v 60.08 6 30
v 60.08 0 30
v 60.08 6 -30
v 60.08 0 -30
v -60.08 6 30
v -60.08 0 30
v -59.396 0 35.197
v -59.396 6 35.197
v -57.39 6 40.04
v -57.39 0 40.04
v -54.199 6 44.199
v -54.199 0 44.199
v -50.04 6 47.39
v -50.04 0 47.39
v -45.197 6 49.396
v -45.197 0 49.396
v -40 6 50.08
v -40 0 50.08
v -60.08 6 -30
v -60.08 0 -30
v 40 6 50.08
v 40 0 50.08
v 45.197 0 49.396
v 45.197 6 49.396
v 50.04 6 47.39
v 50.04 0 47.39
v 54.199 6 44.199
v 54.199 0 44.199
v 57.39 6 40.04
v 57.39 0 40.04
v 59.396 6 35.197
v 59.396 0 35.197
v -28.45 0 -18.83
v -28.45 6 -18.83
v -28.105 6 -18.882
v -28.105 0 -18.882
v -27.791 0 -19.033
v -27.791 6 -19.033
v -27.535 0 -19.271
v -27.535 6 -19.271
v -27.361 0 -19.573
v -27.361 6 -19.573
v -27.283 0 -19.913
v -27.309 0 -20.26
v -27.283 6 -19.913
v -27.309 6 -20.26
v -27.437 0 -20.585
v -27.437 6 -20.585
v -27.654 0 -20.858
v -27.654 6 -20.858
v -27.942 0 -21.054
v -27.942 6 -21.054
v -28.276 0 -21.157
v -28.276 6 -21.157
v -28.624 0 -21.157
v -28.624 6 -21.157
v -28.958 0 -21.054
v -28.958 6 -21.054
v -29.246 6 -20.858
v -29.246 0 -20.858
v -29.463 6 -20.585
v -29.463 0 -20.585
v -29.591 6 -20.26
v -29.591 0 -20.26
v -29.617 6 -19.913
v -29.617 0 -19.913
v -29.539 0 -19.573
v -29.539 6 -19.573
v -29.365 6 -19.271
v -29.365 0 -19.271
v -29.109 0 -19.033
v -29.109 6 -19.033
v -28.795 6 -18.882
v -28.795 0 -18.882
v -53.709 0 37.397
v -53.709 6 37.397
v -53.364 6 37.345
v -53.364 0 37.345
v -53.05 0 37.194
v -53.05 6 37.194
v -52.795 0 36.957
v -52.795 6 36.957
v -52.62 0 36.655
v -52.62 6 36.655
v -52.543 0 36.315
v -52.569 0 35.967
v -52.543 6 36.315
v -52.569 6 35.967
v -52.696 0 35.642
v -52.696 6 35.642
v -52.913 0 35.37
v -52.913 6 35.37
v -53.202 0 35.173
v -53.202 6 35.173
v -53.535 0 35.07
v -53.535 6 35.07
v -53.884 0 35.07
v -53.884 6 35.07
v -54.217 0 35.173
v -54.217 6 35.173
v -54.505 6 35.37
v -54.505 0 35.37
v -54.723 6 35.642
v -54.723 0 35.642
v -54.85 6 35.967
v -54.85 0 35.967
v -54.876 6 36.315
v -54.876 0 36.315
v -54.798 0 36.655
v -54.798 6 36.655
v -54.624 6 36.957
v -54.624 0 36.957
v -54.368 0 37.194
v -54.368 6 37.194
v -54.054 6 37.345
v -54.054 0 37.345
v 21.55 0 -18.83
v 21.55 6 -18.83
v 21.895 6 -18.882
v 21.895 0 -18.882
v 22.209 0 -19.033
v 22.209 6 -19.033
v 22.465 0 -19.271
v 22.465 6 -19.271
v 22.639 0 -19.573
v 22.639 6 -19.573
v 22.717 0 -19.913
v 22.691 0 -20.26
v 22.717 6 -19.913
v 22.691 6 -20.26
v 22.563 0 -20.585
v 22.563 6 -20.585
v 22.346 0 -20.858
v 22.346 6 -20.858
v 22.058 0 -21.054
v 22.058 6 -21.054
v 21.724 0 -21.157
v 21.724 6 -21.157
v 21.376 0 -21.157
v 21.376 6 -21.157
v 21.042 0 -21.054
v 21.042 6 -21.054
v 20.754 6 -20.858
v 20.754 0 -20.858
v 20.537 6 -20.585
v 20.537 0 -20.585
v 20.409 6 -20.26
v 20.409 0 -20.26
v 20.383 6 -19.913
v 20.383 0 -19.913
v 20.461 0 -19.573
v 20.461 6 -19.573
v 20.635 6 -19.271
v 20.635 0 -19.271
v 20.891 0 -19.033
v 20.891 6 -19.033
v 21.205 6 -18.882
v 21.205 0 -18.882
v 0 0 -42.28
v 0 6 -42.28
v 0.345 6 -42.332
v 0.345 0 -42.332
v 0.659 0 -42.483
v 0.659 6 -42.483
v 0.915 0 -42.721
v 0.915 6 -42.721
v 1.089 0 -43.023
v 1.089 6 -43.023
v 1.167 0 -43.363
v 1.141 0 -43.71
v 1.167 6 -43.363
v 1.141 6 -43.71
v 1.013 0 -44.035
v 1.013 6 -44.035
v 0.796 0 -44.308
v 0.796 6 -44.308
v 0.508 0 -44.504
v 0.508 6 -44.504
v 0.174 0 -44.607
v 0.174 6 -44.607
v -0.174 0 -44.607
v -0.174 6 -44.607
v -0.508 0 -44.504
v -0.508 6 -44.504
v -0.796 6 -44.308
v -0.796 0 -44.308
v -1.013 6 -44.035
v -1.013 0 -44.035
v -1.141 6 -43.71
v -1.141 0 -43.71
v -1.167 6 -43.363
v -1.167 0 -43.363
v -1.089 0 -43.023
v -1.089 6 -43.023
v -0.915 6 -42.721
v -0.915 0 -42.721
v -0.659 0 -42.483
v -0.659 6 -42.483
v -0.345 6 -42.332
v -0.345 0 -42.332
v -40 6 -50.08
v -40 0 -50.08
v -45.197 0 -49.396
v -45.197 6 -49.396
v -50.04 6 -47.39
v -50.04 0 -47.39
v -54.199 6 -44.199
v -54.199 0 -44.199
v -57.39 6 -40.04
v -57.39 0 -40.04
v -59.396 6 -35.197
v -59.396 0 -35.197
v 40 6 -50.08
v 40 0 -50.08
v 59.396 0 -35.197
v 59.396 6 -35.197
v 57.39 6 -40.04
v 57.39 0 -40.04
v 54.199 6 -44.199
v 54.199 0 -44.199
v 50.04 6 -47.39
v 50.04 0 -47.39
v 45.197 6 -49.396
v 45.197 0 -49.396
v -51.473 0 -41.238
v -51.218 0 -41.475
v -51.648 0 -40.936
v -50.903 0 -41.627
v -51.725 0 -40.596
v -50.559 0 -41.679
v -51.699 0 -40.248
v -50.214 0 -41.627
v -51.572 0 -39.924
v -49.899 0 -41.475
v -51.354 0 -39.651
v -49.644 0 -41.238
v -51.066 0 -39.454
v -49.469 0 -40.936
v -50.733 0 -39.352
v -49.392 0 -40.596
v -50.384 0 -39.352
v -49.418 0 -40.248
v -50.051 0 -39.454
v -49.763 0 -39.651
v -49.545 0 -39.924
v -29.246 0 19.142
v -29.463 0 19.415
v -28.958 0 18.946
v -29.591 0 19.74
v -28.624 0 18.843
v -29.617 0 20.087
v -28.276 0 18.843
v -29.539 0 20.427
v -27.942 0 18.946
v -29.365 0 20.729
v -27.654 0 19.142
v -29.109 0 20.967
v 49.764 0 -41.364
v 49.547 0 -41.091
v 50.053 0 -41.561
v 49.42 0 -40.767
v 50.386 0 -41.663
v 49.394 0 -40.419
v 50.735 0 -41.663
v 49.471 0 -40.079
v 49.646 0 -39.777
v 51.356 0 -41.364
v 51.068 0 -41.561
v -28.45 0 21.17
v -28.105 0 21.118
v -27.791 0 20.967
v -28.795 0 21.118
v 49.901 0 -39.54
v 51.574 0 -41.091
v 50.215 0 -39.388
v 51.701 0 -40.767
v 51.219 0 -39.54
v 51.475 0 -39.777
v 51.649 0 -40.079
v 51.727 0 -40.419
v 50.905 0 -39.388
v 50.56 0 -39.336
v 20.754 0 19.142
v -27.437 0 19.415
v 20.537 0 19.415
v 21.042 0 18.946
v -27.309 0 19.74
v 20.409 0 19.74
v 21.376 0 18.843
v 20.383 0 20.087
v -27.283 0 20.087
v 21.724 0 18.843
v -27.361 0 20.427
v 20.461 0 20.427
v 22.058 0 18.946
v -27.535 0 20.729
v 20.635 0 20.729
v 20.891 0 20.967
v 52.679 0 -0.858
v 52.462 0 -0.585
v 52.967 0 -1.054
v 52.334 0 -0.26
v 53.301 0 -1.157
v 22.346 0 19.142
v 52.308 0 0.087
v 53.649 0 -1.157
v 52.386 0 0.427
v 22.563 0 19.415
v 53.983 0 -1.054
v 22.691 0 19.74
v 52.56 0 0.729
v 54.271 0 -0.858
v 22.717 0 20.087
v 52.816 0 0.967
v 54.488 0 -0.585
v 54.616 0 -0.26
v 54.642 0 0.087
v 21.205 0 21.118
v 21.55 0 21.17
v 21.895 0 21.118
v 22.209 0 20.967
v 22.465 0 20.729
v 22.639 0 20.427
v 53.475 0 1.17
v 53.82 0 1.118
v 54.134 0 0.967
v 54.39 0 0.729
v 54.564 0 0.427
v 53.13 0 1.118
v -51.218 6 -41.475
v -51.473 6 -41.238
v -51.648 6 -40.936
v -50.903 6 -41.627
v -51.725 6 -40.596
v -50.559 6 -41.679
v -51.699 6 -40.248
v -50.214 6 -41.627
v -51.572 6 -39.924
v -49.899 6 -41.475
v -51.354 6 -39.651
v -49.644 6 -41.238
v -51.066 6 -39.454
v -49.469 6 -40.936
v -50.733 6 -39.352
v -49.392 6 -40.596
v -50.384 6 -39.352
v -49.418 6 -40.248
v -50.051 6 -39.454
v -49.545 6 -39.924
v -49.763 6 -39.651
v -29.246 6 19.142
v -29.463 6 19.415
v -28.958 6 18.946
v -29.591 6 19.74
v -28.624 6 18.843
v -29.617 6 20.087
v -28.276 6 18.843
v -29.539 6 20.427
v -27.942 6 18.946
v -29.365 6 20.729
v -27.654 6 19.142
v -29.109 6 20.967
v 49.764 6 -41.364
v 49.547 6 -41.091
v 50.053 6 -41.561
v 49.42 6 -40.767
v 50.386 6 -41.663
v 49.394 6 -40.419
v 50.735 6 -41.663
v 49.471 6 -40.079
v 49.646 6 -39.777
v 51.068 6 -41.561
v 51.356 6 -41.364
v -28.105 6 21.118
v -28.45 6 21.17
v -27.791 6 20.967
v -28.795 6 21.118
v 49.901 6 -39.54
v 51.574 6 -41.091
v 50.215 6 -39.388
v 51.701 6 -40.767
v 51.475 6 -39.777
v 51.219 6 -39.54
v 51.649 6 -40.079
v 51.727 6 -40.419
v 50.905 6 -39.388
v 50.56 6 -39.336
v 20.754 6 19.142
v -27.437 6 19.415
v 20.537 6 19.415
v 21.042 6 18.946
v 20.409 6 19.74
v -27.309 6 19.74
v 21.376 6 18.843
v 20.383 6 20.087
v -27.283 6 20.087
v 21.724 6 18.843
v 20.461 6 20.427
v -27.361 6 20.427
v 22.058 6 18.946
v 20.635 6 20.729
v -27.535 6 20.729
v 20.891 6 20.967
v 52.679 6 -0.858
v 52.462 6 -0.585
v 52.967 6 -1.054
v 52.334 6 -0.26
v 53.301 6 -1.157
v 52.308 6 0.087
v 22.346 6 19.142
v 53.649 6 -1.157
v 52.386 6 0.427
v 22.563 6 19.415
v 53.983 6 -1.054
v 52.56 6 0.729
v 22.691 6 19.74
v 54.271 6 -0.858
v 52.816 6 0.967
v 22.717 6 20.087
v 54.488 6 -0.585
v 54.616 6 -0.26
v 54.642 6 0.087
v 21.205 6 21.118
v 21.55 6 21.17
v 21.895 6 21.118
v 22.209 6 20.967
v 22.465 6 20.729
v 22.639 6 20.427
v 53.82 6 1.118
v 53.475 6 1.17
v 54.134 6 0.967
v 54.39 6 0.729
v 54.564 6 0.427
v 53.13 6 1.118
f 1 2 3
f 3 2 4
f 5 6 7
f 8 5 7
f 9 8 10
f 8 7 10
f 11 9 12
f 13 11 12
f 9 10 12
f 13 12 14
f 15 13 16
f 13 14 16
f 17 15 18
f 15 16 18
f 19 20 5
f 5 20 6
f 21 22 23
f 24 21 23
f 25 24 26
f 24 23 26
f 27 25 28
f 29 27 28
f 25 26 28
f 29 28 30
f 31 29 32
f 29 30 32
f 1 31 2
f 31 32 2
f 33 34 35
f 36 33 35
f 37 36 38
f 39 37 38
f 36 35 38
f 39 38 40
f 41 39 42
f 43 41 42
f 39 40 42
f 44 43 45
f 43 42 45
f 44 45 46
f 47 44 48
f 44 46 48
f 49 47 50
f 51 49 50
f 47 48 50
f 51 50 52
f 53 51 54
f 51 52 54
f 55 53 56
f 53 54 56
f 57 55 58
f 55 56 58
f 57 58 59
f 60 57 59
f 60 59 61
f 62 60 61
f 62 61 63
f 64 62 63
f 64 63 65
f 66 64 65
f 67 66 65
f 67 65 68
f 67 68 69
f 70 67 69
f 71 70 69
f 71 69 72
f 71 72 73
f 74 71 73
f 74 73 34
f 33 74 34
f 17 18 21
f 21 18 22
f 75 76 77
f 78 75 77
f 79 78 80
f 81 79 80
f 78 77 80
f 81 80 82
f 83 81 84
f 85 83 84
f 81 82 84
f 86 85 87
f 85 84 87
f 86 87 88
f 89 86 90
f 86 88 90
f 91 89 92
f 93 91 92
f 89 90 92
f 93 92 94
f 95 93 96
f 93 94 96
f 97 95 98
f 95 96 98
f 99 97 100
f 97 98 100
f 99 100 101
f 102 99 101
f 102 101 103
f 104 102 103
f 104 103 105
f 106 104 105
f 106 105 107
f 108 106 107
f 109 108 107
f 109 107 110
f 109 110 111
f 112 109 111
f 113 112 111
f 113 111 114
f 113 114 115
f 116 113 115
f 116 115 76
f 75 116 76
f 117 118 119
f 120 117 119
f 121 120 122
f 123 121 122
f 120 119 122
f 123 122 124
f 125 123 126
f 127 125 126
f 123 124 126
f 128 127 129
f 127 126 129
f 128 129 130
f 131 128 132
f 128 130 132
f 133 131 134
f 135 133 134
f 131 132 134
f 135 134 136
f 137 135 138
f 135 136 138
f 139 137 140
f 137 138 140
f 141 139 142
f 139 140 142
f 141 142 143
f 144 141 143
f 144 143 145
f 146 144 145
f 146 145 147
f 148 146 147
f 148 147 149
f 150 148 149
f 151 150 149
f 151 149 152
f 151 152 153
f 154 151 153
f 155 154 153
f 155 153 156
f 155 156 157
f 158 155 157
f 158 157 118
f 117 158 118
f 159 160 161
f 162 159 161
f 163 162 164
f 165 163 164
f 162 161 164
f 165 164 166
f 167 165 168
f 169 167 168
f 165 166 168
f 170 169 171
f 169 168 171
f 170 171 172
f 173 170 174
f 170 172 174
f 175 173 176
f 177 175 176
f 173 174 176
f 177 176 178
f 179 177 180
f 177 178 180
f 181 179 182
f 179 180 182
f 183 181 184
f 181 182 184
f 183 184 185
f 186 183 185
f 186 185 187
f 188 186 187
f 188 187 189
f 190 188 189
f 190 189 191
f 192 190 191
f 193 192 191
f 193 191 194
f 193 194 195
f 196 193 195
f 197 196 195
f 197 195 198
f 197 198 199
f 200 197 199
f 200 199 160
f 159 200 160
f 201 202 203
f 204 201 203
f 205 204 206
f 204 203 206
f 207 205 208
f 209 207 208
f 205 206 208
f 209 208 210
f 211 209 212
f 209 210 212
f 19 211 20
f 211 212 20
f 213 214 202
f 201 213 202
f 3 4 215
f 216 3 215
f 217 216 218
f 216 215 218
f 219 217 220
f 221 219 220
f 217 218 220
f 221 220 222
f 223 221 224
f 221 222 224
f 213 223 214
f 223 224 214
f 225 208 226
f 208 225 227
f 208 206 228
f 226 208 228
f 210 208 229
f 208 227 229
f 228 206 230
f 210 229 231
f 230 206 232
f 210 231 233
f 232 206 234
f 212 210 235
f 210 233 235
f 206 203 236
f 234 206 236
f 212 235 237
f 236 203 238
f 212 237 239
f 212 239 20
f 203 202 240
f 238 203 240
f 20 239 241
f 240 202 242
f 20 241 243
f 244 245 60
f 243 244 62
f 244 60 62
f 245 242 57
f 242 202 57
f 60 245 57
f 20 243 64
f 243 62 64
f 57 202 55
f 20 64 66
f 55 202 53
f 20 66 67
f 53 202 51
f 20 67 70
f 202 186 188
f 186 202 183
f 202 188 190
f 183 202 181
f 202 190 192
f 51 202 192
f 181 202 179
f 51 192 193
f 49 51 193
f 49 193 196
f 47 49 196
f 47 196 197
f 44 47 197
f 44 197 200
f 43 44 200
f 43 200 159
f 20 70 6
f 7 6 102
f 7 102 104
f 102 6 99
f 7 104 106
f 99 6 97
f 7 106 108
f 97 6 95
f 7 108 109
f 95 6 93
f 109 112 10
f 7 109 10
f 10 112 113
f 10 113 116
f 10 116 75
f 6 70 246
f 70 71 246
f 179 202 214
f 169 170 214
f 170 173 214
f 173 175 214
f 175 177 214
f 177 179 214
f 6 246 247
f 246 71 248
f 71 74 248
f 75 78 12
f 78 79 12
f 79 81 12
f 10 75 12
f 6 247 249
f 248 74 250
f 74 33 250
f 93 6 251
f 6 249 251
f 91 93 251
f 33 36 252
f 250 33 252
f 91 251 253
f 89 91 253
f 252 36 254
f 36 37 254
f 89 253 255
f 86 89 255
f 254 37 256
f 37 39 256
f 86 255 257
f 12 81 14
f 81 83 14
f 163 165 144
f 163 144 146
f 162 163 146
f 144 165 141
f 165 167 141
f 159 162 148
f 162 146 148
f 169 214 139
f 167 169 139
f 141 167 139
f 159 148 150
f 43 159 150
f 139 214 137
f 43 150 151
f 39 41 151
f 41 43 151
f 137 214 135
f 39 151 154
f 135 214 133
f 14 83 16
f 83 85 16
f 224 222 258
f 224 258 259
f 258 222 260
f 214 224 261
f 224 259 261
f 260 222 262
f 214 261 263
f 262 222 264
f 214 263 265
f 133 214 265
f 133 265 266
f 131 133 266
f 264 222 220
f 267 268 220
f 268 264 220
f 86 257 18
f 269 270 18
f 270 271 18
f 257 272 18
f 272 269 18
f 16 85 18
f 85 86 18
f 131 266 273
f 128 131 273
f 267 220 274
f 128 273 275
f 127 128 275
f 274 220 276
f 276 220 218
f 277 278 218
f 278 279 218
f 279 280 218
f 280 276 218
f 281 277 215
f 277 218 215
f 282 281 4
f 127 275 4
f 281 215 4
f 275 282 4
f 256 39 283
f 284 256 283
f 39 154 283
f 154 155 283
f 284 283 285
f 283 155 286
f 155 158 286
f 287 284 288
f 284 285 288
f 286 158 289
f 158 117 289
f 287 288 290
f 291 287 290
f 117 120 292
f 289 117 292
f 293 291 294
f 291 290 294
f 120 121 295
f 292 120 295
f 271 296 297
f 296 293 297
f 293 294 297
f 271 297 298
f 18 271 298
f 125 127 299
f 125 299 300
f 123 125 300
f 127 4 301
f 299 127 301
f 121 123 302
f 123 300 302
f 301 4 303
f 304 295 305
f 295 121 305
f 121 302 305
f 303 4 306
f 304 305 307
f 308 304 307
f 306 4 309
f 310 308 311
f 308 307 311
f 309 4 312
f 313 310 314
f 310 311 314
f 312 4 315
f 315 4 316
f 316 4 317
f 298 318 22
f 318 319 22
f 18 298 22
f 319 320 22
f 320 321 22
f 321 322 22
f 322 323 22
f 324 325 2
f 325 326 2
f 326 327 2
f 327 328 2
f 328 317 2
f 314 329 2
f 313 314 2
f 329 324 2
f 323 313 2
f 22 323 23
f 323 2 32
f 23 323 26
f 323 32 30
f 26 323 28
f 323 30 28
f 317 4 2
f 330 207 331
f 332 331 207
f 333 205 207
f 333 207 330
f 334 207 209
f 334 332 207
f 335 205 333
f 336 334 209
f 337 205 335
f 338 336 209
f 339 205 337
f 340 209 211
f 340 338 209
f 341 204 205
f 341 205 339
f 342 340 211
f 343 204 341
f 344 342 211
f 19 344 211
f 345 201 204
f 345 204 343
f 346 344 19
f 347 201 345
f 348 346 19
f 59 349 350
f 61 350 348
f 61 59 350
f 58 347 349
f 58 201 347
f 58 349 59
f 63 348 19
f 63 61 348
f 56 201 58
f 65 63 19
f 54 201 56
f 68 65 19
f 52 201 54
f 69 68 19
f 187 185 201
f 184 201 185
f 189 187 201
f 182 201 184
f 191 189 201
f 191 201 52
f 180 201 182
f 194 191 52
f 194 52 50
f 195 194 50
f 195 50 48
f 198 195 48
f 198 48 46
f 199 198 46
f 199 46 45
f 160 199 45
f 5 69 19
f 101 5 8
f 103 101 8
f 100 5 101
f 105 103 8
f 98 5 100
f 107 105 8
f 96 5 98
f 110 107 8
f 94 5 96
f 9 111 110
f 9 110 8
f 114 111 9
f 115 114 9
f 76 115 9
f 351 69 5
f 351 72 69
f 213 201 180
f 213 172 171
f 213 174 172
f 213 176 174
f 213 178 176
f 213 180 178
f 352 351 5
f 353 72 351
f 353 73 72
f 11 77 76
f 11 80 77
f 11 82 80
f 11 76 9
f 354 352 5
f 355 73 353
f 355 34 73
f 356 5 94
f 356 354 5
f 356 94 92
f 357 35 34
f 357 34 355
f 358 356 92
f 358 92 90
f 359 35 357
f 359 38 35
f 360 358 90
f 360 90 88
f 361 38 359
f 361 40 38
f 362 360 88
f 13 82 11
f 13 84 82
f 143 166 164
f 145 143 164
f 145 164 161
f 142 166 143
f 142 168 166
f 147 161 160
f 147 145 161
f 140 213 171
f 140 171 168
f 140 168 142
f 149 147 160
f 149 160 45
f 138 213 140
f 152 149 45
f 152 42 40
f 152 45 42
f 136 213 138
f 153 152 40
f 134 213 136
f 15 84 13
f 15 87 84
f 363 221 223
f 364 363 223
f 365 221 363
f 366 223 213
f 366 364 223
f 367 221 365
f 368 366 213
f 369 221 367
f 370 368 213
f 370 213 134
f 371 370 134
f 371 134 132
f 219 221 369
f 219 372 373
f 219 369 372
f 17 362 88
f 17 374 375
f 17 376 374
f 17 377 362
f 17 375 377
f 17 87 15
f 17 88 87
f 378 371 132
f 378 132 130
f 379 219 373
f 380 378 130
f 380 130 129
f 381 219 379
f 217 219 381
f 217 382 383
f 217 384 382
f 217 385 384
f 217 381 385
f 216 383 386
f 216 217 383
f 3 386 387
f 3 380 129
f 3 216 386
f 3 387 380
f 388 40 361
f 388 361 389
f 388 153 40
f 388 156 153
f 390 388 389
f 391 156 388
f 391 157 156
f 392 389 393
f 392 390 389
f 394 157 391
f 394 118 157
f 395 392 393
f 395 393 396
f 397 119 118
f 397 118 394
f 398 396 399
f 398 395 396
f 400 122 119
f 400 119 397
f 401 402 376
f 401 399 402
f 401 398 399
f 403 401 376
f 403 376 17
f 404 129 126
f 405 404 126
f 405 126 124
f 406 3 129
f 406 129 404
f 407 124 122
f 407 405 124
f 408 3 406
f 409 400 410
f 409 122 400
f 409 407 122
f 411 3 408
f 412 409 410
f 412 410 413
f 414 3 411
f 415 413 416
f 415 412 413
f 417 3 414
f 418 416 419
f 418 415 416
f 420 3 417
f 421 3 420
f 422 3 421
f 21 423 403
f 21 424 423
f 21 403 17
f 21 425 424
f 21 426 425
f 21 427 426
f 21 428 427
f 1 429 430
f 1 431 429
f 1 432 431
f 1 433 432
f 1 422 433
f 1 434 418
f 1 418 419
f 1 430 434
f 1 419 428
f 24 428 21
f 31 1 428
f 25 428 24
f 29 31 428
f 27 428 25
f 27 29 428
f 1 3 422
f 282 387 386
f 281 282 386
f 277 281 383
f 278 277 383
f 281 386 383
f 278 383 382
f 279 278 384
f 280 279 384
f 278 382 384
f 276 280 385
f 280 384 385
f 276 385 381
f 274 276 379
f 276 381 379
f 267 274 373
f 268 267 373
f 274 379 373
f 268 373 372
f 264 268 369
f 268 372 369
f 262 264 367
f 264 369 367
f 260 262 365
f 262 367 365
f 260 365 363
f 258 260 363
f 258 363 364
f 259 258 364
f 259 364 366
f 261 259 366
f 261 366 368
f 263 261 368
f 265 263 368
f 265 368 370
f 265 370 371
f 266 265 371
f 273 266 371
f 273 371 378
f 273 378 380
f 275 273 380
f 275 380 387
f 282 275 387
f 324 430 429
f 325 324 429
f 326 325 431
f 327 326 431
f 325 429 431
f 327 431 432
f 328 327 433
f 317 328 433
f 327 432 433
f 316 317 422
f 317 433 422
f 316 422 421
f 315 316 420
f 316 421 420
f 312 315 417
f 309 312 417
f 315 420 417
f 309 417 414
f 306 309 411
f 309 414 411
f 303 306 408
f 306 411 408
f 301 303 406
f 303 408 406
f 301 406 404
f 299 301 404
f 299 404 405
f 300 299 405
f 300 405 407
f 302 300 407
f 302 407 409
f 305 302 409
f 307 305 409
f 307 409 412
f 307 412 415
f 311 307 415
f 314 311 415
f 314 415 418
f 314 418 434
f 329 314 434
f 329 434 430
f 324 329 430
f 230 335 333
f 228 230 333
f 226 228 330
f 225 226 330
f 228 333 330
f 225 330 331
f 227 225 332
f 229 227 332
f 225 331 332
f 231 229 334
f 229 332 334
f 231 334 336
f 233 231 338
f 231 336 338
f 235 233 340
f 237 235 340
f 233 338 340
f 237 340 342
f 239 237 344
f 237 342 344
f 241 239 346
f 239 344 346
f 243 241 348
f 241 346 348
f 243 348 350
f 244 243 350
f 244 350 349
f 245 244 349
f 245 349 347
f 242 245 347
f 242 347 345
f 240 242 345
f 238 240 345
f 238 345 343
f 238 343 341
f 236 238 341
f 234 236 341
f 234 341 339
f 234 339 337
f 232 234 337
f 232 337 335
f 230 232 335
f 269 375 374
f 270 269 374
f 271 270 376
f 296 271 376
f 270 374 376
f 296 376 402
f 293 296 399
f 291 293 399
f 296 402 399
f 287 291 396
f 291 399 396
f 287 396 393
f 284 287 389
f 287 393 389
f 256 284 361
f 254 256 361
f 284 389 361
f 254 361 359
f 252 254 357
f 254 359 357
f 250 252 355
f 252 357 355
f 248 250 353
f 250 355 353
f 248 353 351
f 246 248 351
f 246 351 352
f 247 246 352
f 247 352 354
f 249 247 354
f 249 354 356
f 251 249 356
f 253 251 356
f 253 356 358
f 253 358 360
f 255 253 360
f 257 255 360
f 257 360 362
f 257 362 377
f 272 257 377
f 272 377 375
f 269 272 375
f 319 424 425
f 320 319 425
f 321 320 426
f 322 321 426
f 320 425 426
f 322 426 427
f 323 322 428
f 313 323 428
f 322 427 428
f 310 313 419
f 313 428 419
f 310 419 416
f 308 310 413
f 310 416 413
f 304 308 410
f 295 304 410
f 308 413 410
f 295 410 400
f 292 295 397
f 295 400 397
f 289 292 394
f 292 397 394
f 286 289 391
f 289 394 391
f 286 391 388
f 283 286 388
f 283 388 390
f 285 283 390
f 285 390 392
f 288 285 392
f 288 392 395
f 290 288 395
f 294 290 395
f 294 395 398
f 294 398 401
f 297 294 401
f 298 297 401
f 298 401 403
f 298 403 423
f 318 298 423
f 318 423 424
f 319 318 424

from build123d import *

# Parameters (mm, degrees)
BOSS_EXTRUDE1_DEPTH = 6
SKETCH2_R           = 1.25
CUT_EXTRUDE1_DEPTH  = 79.33262411
SKETCH3_R           = 1.25
CUT_EXTRUDE2_DEPTH  = 79.33262411
MOVE_FACE1_BY       = 0.08
MOVE_FACE1_2_BY     = 0.08
MOVE_FACE1_3_BY     = 0.08
MOVE_FACE1_4_BY     = 0.08
MOVE_FACE1_5_BY     = 0.08
MOVE_FACE1_6_BY     = 0.08
MOVE_FACE1_7_BY     = 0.08
MOVE_FACE1_8_BY     = 0.08
MOVE_FACE1_9_BY     = 0.08
MOVE_FACE1_10_BY    = 0.08
MOVE_FACE1_11_BY    = 0.08
MOVE_FACE1_12_BY    = 0.08
MOVE_FACE1_13_BY    = 0.08
MOVE_FACE1_14_BY    = 0.08
MOVE_FACE1_15_BY    = 0.08
MOVE_FACE1_16_BY    = 0.08
MOVE_FACE1_17_BY    = 0.08


with BuildPart() as part:
    # Sketch1 → Boss-Extrude1 (new body)
    with BuildSketch(Plane(origin=(0, 0, 0), x_dir=(1, 0, 0), z_dir=(0, 1, 0))):
        with BuildLine():
            Line((-60, 30), (-60, -30))
            ThreePointArc((-60, -30), (-54.142135624, -44.142135624), (-40, -50))
            Line((-40, -50), (40, -50))
            ThreePointArc((40, -50), (54.142135624, -44.142135624), (60, -30))
            Line((60, -30), (60, 30))
            ThreePointArc((60, 30), (54.142135624, 44.142135624), (40, 50))
            Line((40, 50), (-40, 50))
            ThreePointArc((-40, 50), (-54.142135624, 44.142135624), (-60, 30))
        make_face()
    extrude(amount=BOSS_EXTRUDE1_DEPTH)

    # Sketch2 → Cut-Extrude1 (cut, through all)
    with BuildSketch(Plane(origin=(0, 6, 0), x_dir=(1, 0, 0), z_dir=(0, 1, 0))):
        with Locations(Location((53.475, 0, 0), (0, 0, 270))):
            Circle(SKETCH2_R)
        with Locations(Location((-53.709292606, -36.227375296, 0), (0, 0, 270))):
            Circle(SKETCH2_R)
        with Locations(Location((0, 43.45, 0), (0, 0, 270))):
            Circle(SKETCH2_R)
        with Locations(Location((50.560271927, 40.506415982, 0), (0, 0, 270))):
            Circle(SKETCH2_R)
        with Locations(Location((-50.558556763, 40.508556763, 0), (0, 0, 90))):
            Circle(SKETCH2_R)
    extrude(amount=-CUT_EXTRUDE1_DEPTH, mode=Mode.SUBTRACT)

    # Sketch3 → Cut-Extrude2 (cut, through all)
    with BuildSketch(Plane(origin=(0, 6, 0), x_dir=(1, 0, 0), z_dir=(0, 1, 0))):
        with Locations(Location((-28.45, 20, 0), (0, 0, 270))):
            Circle(SKETCH3_R)
        with Locations(Location((21.55, 20, 0), (0, 0, 270))):
            Circle(SKETCH3_R)
        with Locations(Location((-28.45, -20, 0), (0, 0, 270))):
            Circle(SKETCH3_R)
        with Locations(Location((21.55, -20, 0), (0, 0, 270))):
            Circle(SKETCH3_R)
    extrude(amount=-CUT_EXTRUDE2_DEPTH, mode=Mode.SUBTRACT)

    # Move Face1: a curved face moved outward by 0.08
    add(Solid.thicken(part.faces().sort_by_distance((21.55, 3, 18.75))[0], MOVE_FACE1_BY))

    # Move Face1 2: a curved face moved outward by 0.08
    add(Solid.thicken(part.faces().sort_by_distance((54.142135624, 3, 44.142135624))[0], MOVE_FACE1_2_BY))

    # Move Face1 3: a face moved outward by 0.08
    extrude(part.faces().sort_by_distance((60, 3, 0))[0], amount=MOVE_FACE1_3_BY, dir=(1, 0, 0))

    # Move Face1 4: a curved face moved outward by 0.08
    add(Solid.thicken(part.faces().sort_by_distance((54.142135624, 3, -44.142135624))[0], MOVE_FACE1_4_BY))

    # Move Face1 5: a face moved outward by 0.08
    extrude(part.faces().sort_by_distance((0, 3, -50))[0], amount=MOVE_FACE1_5_BY, dir=(0, 0, -1))

    # Move Face1 6: a curved face moved outward by 0.08
    add(Solid.thicken(part.faces().sort_by_distance((-54.142135624, 3, -44.142135624))[0], MOVE_FACE1_6_BY))

    # Move Face1 7: a face moved outward by 0.08
    extrude(part.faces().sort_by_distance((-60, 3, 0))[0], amount=MOVE_FACE1_7_BY, dir=(-1, 0, 0))

    # Move Face1 8: a curved face moved outward by 0.08
    add(Solid.thicken(part.faces().sort_by_distance((-54.142135624, 3, 44.142135624))[0], MOVE_FACE1_8_BY))

    # Move Face1 9: a face moved outward by 0.08
    extrude(part.faces().sort_by_distance((0, 3, 50))[0], amount=MOVE_FACE1_9_BY, dir=(0, 0, 1))

    # Move Face1 10: a curved face moved outward by 0.08
    add(Solid.thicken(part.faces().sort_by_distance((53.475, 3, -1.25))[0], MOVE_FACE1_10_BY))

    # Move Face1 11: a curved face moved outward by 0.08
    add(Solid.thicken(part.faces().sort_by_distance((0, 3, -44.7))[0], MOVE_FACE1_11_BY))

    # Move Face1 12: a curved face moved outward by 0.08
    add(Solid.thicken(part.faces().sort_by_distance((50.560271927, 3, -41.756415982))[0], MOVE_FACE1_12_BY))

    # Move Face1 13: a curved face moved outward by 0.08
    add(Solid.thicken(part.faces().sort_by_distance((-50.558556763, 3, -39.258556763))[0], MOVE_FACE1_13_BY))

    # Move Face1 14: a curved face moved outward by 0.08
    add(Solid.thicken(part.faces().sort_by_distance((-53.709292606, 3, 34.977375296))[0], MOVE_FACE1_14_BY))

    # Move Face1 15: a curved face moved outward by 0.08
    add(Solid.thicken(part.faces().sort_by_distance((-28.45, 3, -21.25))[0], MOVE_FACE1_15_BY))

    # Move Face1 16: a curved face moved outward by 0.08
    add(Solid.thicken(part.faces().sort_by_distance((21.55, 3, -21.25))[0], MOVE_FACE1_16_BY))

    # Move Face1 17: a curved face moved outward by 0.08
    add(Solid.thicken(part.faces().sort_by_distance((-28.45, 3, 18.75))[0], MOVE_FACE1_17_BY))


solid = part.part
